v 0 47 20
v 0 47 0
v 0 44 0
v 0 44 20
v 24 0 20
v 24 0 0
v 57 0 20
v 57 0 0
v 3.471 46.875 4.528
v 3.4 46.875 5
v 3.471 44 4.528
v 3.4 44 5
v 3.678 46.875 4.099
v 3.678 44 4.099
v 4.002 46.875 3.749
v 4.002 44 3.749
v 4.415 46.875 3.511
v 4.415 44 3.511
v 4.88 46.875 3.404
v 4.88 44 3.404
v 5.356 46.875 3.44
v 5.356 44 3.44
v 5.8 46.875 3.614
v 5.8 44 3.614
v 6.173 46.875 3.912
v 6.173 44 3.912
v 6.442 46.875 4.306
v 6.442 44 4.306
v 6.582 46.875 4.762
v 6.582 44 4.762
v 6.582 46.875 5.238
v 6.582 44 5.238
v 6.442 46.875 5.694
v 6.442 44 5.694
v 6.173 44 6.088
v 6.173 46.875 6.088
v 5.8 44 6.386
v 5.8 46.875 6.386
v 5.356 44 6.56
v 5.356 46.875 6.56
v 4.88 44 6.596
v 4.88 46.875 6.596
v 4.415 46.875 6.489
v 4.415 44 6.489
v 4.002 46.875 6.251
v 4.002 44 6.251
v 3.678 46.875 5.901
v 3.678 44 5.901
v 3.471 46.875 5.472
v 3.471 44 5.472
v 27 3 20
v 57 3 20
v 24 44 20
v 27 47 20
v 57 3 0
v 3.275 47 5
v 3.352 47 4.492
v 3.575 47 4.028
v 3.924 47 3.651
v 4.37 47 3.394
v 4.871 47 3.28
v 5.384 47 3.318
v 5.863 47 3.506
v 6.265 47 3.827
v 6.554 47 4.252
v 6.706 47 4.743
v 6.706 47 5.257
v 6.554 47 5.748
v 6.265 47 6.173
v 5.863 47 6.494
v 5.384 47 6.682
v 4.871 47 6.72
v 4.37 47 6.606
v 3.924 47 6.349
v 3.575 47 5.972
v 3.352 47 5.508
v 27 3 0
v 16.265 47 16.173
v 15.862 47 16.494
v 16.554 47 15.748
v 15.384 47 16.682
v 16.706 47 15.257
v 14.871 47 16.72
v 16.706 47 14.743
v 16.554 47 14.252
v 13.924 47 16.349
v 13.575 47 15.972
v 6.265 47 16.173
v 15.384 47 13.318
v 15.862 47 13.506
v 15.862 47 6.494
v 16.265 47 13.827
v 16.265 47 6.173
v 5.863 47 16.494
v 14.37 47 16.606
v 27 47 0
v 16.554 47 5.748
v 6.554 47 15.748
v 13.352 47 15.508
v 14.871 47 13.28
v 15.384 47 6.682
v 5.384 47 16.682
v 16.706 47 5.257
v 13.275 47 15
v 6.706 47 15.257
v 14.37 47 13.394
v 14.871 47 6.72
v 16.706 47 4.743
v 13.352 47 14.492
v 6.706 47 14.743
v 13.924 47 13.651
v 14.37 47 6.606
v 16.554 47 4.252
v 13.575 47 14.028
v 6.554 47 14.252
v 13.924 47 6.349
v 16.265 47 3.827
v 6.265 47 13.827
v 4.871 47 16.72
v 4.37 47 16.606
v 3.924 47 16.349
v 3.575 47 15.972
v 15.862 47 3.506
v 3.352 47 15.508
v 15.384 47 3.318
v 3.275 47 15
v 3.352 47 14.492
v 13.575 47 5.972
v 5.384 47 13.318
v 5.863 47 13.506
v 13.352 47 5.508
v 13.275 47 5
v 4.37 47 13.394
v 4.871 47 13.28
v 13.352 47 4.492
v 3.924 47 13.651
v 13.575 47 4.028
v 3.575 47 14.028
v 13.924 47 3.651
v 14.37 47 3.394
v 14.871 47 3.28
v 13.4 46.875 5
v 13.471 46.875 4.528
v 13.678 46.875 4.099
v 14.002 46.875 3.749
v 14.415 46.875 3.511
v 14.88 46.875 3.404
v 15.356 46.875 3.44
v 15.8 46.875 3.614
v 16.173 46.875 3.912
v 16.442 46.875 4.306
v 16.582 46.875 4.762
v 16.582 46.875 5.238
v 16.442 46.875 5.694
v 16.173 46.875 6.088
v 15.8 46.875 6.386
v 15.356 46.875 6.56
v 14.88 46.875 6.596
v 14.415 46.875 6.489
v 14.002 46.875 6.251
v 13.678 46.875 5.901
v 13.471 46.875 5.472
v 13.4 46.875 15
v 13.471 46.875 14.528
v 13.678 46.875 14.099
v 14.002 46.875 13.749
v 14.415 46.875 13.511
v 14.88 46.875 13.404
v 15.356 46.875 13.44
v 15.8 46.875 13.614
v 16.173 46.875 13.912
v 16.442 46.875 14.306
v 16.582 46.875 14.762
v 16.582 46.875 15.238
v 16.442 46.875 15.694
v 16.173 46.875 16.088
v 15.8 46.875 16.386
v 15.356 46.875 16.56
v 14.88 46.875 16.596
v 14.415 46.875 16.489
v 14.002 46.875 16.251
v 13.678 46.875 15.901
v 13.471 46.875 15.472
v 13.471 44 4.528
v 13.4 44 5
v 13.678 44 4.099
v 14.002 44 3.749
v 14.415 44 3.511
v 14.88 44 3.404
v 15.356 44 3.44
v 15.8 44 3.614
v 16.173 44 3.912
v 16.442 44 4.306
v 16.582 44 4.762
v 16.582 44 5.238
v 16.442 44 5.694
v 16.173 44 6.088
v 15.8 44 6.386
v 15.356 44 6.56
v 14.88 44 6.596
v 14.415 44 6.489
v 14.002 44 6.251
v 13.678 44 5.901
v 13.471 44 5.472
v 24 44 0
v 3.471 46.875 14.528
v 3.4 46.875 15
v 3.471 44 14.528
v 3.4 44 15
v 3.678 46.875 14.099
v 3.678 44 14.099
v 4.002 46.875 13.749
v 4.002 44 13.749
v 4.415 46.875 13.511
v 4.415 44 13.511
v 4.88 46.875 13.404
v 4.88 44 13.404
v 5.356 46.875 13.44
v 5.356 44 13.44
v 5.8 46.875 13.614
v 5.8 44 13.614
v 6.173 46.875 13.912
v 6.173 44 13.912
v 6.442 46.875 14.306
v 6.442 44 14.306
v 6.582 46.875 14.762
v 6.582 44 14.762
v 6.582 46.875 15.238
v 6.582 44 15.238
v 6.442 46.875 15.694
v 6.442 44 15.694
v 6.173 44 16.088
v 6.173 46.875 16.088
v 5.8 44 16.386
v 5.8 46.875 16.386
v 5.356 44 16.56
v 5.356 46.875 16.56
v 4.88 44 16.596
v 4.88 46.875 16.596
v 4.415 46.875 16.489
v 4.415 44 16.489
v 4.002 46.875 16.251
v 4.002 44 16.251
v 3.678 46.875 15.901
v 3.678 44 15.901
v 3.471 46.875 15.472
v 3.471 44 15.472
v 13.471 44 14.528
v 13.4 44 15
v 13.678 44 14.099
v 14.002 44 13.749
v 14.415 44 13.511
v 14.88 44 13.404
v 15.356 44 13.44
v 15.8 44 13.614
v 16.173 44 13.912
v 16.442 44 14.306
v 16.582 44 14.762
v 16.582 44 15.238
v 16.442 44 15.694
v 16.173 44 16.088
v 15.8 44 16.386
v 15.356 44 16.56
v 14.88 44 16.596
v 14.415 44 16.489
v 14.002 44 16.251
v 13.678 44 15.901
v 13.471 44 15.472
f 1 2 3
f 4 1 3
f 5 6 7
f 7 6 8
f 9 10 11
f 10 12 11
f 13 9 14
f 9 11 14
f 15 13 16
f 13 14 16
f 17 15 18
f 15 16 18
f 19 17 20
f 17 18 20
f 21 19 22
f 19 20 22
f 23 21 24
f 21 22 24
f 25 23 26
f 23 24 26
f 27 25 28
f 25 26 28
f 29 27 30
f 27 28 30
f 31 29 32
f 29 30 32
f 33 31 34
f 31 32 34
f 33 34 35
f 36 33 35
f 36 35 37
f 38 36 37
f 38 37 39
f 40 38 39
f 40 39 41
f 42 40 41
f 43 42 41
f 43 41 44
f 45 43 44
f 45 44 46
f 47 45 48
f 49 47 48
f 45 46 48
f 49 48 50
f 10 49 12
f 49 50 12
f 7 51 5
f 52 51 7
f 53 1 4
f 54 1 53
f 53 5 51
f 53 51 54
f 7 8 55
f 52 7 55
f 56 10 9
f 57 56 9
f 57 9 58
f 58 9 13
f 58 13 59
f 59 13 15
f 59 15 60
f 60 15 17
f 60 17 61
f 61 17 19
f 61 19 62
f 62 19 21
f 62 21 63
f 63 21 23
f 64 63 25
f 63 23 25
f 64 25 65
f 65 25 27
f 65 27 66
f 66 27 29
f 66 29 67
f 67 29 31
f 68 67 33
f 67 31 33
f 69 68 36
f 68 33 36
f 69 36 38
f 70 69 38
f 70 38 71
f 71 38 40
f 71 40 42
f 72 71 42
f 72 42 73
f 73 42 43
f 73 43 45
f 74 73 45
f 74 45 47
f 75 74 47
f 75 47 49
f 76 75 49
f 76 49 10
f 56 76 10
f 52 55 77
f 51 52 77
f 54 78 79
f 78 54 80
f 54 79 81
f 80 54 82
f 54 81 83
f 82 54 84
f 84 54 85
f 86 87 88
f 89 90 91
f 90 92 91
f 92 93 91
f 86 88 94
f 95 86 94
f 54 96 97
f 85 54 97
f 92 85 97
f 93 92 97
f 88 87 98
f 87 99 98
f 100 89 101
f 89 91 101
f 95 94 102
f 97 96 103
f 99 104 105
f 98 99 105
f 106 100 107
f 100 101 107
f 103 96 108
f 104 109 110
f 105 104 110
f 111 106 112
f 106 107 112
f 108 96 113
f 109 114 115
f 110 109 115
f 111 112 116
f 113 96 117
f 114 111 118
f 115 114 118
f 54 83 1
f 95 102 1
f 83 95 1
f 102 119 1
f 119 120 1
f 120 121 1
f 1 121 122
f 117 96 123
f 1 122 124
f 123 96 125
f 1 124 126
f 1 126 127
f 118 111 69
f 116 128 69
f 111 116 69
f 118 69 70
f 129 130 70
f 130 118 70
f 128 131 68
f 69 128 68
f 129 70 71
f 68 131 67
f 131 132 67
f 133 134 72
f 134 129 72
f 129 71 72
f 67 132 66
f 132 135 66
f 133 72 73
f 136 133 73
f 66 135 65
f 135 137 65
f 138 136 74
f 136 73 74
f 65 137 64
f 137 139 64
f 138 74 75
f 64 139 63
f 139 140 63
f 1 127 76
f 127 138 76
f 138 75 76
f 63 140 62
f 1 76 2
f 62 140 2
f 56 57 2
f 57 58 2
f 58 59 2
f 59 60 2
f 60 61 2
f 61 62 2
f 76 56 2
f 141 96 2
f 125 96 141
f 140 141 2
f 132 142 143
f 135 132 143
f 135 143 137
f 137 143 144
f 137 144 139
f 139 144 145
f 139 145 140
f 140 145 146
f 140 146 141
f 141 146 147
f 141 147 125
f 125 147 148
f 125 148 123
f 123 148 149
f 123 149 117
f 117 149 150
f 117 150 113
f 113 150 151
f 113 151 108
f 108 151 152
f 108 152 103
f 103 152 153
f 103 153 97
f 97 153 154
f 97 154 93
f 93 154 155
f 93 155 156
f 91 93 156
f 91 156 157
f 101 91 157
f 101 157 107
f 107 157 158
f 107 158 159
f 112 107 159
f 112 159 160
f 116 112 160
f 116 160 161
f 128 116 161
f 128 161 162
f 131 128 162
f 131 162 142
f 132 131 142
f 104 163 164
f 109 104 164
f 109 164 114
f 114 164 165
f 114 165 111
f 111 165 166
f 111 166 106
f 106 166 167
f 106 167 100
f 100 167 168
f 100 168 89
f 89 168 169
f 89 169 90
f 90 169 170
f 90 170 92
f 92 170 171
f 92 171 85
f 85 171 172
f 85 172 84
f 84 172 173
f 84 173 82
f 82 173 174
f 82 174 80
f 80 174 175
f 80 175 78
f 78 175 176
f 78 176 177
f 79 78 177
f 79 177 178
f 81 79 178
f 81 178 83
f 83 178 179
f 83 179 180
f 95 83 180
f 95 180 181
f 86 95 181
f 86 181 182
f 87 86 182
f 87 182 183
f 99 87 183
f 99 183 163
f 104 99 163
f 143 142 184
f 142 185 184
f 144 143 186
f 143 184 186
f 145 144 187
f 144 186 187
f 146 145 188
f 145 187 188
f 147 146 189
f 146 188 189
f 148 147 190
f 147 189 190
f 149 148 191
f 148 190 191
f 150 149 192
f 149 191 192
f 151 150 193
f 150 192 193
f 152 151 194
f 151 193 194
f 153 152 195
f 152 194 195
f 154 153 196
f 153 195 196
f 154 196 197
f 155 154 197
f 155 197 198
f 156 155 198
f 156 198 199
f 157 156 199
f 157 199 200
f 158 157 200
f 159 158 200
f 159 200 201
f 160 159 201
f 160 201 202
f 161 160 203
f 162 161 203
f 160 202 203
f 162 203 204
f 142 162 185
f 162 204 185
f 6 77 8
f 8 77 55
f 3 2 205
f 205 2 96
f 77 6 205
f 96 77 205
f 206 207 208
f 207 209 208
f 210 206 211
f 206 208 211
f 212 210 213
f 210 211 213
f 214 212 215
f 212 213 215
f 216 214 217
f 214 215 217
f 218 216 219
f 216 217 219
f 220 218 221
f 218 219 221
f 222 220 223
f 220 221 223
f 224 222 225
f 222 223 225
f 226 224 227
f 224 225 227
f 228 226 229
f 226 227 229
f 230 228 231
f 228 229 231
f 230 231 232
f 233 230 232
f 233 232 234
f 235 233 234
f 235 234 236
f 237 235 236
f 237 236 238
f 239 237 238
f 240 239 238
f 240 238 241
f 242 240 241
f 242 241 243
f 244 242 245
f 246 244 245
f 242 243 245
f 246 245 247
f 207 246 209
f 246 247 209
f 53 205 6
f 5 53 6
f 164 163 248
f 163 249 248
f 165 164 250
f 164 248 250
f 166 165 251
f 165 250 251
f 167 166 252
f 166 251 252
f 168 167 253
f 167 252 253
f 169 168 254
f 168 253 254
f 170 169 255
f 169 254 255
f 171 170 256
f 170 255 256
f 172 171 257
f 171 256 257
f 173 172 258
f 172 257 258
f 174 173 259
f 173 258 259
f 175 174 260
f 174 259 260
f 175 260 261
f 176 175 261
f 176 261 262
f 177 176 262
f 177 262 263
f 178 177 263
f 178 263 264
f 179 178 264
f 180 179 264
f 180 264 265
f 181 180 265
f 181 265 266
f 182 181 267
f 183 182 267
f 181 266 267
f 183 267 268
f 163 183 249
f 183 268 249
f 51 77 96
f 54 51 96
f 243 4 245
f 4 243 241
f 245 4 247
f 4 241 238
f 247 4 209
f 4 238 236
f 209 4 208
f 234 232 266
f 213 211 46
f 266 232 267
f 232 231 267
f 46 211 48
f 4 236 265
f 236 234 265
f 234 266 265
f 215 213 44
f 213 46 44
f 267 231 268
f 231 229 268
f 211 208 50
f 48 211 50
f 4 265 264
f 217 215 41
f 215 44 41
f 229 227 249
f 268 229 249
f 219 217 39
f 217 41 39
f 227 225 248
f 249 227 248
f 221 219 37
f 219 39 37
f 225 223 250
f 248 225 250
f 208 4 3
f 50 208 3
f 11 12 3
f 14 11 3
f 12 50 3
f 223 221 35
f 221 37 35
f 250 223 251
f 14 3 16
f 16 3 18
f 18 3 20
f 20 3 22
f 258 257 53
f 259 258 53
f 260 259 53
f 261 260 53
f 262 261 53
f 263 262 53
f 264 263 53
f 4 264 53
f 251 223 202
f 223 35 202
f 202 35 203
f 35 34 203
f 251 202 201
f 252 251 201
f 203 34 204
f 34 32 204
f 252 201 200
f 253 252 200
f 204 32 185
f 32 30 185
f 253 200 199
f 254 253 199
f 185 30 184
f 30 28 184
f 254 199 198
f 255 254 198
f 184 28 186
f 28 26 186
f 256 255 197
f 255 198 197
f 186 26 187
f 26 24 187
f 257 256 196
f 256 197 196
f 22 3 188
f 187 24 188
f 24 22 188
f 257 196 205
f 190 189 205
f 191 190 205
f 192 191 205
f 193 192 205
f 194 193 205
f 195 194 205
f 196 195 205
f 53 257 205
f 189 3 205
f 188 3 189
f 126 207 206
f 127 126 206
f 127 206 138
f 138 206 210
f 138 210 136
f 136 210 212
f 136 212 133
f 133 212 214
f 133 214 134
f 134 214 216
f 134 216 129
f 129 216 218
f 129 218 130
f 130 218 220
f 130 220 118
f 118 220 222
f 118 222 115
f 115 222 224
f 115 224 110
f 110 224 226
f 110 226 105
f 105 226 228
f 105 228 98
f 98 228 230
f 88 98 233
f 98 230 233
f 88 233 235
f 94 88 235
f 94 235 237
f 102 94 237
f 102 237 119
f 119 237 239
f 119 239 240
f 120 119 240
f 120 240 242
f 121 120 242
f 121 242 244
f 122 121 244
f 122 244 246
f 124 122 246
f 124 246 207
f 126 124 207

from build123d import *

# Parameters (mm, degrees)
BOSS_EXTRUDE1_DEPTH            = 20
M3_CLEARANCE_HOLE1_D           = 3.2
M3_CLEARANCE_HOLE1_CSINK_D     = 3.45
M3_CLEARANCE_HOLE1_CSINK_ANGLE = 90


with BuildPart() as part:
    # Sketch1 → Boss-Extrude1 (new body)
    with BuildSketch(Plane.XY):
        Polygon((0, 44), (24, 44), (24, 0), (57, 0), (57, 3), (27, 3), (27, 47), (0, 47), align=None)
    extrude(amount=BOSS_EXTRUDE1_DEPTH)

    # M3 Clearance Hole1 (through all)
    with Locations(Plane(origin=(0, 47, 0), x_dir=(1, 0, 0), z_dir=(0, 1, 0))):
        with Locations((15, -15), (5, -5), (5, -15), (15, -5)):
            CounterSinkHole(M3_CLEARANCE_HOLE1_D / 2, M3_CLEARANCE_HOLE1_CSINK_D / 2, counter_sink_angle=M3_CLEARANCE_HOLE1_CSINK_ANGLE)


solid = part.part
